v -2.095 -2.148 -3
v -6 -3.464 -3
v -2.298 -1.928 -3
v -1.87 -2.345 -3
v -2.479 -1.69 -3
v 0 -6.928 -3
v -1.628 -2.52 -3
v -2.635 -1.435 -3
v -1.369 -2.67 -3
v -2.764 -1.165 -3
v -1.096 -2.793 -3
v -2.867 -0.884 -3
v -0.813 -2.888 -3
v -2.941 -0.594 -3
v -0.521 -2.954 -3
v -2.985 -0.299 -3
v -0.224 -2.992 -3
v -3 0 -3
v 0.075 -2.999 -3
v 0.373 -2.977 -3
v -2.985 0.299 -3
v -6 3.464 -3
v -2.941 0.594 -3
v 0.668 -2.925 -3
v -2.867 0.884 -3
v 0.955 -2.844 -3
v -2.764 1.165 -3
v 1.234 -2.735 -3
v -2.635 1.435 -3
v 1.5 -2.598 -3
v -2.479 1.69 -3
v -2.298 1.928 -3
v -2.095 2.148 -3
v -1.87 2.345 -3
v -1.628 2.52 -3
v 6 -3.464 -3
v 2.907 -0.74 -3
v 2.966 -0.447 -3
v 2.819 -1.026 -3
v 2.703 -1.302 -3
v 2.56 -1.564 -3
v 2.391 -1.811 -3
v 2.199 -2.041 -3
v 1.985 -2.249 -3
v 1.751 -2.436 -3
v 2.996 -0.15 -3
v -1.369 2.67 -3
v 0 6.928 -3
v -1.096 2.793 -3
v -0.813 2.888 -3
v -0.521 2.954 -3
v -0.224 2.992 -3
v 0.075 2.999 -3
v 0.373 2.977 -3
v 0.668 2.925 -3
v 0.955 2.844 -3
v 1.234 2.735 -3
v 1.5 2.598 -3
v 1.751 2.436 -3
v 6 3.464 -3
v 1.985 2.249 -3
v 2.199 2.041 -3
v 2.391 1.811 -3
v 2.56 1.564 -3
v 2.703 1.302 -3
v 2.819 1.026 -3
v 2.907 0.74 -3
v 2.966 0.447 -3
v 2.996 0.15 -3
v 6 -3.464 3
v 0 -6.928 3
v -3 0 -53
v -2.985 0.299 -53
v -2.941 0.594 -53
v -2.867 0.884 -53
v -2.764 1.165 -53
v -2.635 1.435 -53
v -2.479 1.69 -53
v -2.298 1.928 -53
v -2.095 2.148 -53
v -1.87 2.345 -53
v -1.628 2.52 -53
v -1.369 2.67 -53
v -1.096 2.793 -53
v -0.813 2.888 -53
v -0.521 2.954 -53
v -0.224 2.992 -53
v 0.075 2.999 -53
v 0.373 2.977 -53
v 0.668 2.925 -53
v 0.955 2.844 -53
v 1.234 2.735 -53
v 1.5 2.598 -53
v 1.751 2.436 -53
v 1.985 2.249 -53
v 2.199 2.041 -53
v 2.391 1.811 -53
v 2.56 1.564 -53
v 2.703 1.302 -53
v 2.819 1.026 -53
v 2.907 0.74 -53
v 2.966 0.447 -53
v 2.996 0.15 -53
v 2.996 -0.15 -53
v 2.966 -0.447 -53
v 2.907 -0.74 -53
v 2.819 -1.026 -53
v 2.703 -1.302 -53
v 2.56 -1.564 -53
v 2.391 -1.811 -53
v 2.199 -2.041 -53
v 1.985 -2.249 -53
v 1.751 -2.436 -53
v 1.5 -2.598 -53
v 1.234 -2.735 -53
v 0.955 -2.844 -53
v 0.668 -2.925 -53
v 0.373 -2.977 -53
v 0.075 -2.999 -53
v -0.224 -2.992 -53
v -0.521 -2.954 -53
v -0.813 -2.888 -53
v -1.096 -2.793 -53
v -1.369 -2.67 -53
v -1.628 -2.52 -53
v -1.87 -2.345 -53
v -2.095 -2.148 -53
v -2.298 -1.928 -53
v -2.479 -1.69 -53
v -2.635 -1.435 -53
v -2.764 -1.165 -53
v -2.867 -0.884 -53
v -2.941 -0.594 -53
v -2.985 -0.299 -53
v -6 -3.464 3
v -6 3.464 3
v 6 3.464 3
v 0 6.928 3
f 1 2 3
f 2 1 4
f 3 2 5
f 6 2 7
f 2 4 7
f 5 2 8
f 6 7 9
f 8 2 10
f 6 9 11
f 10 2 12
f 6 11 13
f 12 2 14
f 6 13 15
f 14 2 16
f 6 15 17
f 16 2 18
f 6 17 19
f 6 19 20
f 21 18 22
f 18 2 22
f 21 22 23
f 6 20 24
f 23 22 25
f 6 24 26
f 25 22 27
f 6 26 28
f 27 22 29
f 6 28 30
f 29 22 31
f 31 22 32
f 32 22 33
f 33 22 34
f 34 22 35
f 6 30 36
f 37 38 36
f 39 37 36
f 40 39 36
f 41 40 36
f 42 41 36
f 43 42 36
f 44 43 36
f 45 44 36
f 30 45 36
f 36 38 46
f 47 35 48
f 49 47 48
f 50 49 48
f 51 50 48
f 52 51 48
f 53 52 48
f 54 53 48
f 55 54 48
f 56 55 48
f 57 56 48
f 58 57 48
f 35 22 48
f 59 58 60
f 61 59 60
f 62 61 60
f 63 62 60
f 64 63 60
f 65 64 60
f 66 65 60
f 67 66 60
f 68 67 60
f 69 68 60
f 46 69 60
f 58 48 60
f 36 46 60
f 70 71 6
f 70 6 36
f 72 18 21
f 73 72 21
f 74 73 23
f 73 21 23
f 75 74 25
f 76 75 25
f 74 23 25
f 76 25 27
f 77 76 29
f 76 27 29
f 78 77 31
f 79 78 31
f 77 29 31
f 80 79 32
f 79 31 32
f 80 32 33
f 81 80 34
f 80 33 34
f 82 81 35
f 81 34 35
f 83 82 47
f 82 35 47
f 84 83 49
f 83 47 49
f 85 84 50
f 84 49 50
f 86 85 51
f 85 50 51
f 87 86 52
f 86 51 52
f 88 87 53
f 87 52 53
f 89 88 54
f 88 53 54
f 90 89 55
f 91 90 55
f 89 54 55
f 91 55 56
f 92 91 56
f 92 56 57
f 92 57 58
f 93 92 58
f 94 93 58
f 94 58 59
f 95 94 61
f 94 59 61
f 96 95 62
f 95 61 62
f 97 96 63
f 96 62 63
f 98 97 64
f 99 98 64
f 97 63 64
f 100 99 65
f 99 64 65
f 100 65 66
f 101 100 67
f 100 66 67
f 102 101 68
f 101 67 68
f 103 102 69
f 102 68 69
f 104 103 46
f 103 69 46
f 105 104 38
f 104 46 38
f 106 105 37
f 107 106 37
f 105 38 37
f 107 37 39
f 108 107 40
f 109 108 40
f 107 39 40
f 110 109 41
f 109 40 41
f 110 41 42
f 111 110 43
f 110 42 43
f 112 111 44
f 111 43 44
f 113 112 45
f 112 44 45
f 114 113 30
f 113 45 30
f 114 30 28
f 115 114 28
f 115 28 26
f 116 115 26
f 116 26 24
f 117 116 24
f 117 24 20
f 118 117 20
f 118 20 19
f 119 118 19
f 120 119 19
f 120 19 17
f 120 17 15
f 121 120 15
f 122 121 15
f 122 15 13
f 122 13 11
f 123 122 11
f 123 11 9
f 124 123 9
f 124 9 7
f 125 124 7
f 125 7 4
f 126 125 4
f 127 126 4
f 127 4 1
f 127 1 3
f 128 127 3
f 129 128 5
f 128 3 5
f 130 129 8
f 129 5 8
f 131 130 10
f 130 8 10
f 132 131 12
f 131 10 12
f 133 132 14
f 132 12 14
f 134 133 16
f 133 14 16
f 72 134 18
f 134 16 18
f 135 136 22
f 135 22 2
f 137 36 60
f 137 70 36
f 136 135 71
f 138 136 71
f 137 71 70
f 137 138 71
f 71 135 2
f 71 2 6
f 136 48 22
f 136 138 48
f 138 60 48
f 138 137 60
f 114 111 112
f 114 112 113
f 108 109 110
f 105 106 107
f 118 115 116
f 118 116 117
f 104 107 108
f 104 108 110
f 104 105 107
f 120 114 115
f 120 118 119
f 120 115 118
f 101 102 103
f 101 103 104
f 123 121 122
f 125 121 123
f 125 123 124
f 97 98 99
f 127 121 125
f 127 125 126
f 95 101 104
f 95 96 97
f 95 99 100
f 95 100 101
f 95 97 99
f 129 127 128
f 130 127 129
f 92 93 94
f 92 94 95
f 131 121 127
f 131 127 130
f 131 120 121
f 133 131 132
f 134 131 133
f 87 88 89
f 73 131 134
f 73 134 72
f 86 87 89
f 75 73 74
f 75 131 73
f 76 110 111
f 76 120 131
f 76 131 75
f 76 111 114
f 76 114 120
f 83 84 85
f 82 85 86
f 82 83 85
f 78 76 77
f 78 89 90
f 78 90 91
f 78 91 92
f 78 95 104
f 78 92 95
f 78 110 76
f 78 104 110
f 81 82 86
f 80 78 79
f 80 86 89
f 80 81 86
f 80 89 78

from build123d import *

# Parameters (mm, degrees)
BOSS_EXTRUDE2_DEPTH = 3
SKETCH5_R           = 3
BOSS_EXTRUDE3_DEPTH = 50


with BuildPart() as part:
    # Sketch4 → Boss-Extrude2 (new, symmetric)
    with BuildSketch(Plane.XY):
        Polygon((0, 6.92820323), (-6, 3.464101615), (-6, -3.464101615), (0, -6.92820323), (6, -3.464101615), (6, 3.464101615), align=None)
    extrude(amount=BOSS_EXTRUDE2_DEPTH, both=True)

    # Sketch5 → Boss-Extrude3 (add)
    with BuildSketch(Plane(origin=(0, 0, -3), x_dir=(-1, 0, 0), z_dir=(0, 0, -1))):
        Circle(SKETCH5_R)
    extrude(amount=BOSS_EXTRUDE3_DEPTH)


solid = part.part
